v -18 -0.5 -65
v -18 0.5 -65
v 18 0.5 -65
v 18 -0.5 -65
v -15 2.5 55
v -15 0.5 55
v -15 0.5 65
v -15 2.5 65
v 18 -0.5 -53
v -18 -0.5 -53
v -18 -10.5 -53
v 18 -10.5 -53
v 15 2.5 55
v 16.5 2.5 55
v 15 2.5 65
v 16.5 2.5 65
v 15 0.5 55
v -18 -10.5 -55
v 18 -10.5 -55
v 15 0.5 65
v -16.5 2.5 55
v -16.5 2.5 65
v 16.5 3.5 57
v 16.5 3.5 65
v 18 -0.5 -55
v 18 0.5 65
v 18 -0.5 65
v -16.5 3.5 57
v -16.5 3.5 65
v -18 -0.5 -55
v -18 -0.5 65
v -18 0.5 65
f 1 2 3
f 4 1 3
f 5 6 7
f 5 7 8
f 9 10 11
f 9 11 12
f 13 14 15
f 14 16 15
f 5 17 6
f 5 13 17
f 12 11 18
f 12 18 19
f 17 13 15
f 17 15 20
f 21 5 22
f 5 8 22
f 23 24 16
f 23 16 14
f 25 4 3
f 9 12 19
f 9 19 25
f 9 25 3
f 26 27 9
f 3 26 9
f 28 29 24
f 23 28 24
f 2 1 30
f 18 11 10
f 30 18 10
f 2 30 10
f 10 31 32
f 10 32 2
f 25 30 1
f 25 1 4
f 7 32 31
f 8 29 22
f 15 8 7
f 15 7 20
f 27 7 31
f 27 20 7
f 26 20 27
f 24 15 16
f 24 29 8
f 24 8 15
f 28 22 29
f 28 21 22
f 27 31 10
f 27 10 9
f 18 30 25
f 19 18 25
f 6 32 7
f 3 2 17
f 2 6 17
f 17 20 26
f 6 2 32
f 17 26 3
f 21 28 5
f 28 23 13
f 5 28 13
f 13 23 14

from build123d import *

# Parameters (mm, degrees)
SKETCH1_W           = 36
SKETCH1_H           = 1
BOSS_EXTRUDE1_DEPTH = 65
BOSS_EXTRUDE2_DEPTH = 5
SKETCH3_W           = 36
SKETCH3_H           = 2
BOSS_EXTRUDE3_DEPTH = 10
CUT_EXTRUDE1_REACH  = 76.334


with BuildPart() as part:
    # Sketch1 → Boss-Extrude1 (new, symmetric)
    with BuildSketch(Plane.XY):
        Rectangle(SKETCH1_W, SKETCH1_H)
    extrude(amount=BOSS_EXTRUDE1_DEPTH, both=True)

    # Sketch2 → Boss-Extrude2 (add, symmetric)
    with BuildSketch(Plane.XY.offset(60)):
        Polygon((-15, 0.5), (-15, 2.5), (-16.5, 2.5), (-16.5, 3.5), (16.5, 3.5), (16.5, 2.5), (15, 2.5), (15, 0.5), align=None)
    extrude(amount=BOSS_EXTRUDE2_DEPTH, both=True)

    # Sketch3 → Boss-Extrude3 (add)
    with BuildSketch(Plane.XZ.offset(0.5)):
        with Locations((0, -54)):
            Rectangle(SKETCH3_W, SKETCH3_H)
    extrude(amount=BOSS_EXTRUDE3_DEPTH)

    # Sketch4 → Cut-Extrude1 (cut, up to next)
    with BuildSketch(Plane(origin=(16.5, 0, 0), x_dir=(0, 0, -1), z_dir=(1, 0, 0)), mode=Mode.PRIVATE) as cut_extrude1_sk1:
        Polygon((-57, 3.5), (-55, 2.5), (-55, 3.5), align=None)
    cut_extrude1_tool1 = extrude(cut_extrude1_sk1.sketch, amount=-CUT_EXTRUDE1_REACH, mode=Mode.PRIVATE) & part.part
    add(cut_extrude1_tool1.solids().sort_by_distance((16.5, 3.166667, 55.666667))[0], mode=Mode.SUBTRACT)


solid = part.part
